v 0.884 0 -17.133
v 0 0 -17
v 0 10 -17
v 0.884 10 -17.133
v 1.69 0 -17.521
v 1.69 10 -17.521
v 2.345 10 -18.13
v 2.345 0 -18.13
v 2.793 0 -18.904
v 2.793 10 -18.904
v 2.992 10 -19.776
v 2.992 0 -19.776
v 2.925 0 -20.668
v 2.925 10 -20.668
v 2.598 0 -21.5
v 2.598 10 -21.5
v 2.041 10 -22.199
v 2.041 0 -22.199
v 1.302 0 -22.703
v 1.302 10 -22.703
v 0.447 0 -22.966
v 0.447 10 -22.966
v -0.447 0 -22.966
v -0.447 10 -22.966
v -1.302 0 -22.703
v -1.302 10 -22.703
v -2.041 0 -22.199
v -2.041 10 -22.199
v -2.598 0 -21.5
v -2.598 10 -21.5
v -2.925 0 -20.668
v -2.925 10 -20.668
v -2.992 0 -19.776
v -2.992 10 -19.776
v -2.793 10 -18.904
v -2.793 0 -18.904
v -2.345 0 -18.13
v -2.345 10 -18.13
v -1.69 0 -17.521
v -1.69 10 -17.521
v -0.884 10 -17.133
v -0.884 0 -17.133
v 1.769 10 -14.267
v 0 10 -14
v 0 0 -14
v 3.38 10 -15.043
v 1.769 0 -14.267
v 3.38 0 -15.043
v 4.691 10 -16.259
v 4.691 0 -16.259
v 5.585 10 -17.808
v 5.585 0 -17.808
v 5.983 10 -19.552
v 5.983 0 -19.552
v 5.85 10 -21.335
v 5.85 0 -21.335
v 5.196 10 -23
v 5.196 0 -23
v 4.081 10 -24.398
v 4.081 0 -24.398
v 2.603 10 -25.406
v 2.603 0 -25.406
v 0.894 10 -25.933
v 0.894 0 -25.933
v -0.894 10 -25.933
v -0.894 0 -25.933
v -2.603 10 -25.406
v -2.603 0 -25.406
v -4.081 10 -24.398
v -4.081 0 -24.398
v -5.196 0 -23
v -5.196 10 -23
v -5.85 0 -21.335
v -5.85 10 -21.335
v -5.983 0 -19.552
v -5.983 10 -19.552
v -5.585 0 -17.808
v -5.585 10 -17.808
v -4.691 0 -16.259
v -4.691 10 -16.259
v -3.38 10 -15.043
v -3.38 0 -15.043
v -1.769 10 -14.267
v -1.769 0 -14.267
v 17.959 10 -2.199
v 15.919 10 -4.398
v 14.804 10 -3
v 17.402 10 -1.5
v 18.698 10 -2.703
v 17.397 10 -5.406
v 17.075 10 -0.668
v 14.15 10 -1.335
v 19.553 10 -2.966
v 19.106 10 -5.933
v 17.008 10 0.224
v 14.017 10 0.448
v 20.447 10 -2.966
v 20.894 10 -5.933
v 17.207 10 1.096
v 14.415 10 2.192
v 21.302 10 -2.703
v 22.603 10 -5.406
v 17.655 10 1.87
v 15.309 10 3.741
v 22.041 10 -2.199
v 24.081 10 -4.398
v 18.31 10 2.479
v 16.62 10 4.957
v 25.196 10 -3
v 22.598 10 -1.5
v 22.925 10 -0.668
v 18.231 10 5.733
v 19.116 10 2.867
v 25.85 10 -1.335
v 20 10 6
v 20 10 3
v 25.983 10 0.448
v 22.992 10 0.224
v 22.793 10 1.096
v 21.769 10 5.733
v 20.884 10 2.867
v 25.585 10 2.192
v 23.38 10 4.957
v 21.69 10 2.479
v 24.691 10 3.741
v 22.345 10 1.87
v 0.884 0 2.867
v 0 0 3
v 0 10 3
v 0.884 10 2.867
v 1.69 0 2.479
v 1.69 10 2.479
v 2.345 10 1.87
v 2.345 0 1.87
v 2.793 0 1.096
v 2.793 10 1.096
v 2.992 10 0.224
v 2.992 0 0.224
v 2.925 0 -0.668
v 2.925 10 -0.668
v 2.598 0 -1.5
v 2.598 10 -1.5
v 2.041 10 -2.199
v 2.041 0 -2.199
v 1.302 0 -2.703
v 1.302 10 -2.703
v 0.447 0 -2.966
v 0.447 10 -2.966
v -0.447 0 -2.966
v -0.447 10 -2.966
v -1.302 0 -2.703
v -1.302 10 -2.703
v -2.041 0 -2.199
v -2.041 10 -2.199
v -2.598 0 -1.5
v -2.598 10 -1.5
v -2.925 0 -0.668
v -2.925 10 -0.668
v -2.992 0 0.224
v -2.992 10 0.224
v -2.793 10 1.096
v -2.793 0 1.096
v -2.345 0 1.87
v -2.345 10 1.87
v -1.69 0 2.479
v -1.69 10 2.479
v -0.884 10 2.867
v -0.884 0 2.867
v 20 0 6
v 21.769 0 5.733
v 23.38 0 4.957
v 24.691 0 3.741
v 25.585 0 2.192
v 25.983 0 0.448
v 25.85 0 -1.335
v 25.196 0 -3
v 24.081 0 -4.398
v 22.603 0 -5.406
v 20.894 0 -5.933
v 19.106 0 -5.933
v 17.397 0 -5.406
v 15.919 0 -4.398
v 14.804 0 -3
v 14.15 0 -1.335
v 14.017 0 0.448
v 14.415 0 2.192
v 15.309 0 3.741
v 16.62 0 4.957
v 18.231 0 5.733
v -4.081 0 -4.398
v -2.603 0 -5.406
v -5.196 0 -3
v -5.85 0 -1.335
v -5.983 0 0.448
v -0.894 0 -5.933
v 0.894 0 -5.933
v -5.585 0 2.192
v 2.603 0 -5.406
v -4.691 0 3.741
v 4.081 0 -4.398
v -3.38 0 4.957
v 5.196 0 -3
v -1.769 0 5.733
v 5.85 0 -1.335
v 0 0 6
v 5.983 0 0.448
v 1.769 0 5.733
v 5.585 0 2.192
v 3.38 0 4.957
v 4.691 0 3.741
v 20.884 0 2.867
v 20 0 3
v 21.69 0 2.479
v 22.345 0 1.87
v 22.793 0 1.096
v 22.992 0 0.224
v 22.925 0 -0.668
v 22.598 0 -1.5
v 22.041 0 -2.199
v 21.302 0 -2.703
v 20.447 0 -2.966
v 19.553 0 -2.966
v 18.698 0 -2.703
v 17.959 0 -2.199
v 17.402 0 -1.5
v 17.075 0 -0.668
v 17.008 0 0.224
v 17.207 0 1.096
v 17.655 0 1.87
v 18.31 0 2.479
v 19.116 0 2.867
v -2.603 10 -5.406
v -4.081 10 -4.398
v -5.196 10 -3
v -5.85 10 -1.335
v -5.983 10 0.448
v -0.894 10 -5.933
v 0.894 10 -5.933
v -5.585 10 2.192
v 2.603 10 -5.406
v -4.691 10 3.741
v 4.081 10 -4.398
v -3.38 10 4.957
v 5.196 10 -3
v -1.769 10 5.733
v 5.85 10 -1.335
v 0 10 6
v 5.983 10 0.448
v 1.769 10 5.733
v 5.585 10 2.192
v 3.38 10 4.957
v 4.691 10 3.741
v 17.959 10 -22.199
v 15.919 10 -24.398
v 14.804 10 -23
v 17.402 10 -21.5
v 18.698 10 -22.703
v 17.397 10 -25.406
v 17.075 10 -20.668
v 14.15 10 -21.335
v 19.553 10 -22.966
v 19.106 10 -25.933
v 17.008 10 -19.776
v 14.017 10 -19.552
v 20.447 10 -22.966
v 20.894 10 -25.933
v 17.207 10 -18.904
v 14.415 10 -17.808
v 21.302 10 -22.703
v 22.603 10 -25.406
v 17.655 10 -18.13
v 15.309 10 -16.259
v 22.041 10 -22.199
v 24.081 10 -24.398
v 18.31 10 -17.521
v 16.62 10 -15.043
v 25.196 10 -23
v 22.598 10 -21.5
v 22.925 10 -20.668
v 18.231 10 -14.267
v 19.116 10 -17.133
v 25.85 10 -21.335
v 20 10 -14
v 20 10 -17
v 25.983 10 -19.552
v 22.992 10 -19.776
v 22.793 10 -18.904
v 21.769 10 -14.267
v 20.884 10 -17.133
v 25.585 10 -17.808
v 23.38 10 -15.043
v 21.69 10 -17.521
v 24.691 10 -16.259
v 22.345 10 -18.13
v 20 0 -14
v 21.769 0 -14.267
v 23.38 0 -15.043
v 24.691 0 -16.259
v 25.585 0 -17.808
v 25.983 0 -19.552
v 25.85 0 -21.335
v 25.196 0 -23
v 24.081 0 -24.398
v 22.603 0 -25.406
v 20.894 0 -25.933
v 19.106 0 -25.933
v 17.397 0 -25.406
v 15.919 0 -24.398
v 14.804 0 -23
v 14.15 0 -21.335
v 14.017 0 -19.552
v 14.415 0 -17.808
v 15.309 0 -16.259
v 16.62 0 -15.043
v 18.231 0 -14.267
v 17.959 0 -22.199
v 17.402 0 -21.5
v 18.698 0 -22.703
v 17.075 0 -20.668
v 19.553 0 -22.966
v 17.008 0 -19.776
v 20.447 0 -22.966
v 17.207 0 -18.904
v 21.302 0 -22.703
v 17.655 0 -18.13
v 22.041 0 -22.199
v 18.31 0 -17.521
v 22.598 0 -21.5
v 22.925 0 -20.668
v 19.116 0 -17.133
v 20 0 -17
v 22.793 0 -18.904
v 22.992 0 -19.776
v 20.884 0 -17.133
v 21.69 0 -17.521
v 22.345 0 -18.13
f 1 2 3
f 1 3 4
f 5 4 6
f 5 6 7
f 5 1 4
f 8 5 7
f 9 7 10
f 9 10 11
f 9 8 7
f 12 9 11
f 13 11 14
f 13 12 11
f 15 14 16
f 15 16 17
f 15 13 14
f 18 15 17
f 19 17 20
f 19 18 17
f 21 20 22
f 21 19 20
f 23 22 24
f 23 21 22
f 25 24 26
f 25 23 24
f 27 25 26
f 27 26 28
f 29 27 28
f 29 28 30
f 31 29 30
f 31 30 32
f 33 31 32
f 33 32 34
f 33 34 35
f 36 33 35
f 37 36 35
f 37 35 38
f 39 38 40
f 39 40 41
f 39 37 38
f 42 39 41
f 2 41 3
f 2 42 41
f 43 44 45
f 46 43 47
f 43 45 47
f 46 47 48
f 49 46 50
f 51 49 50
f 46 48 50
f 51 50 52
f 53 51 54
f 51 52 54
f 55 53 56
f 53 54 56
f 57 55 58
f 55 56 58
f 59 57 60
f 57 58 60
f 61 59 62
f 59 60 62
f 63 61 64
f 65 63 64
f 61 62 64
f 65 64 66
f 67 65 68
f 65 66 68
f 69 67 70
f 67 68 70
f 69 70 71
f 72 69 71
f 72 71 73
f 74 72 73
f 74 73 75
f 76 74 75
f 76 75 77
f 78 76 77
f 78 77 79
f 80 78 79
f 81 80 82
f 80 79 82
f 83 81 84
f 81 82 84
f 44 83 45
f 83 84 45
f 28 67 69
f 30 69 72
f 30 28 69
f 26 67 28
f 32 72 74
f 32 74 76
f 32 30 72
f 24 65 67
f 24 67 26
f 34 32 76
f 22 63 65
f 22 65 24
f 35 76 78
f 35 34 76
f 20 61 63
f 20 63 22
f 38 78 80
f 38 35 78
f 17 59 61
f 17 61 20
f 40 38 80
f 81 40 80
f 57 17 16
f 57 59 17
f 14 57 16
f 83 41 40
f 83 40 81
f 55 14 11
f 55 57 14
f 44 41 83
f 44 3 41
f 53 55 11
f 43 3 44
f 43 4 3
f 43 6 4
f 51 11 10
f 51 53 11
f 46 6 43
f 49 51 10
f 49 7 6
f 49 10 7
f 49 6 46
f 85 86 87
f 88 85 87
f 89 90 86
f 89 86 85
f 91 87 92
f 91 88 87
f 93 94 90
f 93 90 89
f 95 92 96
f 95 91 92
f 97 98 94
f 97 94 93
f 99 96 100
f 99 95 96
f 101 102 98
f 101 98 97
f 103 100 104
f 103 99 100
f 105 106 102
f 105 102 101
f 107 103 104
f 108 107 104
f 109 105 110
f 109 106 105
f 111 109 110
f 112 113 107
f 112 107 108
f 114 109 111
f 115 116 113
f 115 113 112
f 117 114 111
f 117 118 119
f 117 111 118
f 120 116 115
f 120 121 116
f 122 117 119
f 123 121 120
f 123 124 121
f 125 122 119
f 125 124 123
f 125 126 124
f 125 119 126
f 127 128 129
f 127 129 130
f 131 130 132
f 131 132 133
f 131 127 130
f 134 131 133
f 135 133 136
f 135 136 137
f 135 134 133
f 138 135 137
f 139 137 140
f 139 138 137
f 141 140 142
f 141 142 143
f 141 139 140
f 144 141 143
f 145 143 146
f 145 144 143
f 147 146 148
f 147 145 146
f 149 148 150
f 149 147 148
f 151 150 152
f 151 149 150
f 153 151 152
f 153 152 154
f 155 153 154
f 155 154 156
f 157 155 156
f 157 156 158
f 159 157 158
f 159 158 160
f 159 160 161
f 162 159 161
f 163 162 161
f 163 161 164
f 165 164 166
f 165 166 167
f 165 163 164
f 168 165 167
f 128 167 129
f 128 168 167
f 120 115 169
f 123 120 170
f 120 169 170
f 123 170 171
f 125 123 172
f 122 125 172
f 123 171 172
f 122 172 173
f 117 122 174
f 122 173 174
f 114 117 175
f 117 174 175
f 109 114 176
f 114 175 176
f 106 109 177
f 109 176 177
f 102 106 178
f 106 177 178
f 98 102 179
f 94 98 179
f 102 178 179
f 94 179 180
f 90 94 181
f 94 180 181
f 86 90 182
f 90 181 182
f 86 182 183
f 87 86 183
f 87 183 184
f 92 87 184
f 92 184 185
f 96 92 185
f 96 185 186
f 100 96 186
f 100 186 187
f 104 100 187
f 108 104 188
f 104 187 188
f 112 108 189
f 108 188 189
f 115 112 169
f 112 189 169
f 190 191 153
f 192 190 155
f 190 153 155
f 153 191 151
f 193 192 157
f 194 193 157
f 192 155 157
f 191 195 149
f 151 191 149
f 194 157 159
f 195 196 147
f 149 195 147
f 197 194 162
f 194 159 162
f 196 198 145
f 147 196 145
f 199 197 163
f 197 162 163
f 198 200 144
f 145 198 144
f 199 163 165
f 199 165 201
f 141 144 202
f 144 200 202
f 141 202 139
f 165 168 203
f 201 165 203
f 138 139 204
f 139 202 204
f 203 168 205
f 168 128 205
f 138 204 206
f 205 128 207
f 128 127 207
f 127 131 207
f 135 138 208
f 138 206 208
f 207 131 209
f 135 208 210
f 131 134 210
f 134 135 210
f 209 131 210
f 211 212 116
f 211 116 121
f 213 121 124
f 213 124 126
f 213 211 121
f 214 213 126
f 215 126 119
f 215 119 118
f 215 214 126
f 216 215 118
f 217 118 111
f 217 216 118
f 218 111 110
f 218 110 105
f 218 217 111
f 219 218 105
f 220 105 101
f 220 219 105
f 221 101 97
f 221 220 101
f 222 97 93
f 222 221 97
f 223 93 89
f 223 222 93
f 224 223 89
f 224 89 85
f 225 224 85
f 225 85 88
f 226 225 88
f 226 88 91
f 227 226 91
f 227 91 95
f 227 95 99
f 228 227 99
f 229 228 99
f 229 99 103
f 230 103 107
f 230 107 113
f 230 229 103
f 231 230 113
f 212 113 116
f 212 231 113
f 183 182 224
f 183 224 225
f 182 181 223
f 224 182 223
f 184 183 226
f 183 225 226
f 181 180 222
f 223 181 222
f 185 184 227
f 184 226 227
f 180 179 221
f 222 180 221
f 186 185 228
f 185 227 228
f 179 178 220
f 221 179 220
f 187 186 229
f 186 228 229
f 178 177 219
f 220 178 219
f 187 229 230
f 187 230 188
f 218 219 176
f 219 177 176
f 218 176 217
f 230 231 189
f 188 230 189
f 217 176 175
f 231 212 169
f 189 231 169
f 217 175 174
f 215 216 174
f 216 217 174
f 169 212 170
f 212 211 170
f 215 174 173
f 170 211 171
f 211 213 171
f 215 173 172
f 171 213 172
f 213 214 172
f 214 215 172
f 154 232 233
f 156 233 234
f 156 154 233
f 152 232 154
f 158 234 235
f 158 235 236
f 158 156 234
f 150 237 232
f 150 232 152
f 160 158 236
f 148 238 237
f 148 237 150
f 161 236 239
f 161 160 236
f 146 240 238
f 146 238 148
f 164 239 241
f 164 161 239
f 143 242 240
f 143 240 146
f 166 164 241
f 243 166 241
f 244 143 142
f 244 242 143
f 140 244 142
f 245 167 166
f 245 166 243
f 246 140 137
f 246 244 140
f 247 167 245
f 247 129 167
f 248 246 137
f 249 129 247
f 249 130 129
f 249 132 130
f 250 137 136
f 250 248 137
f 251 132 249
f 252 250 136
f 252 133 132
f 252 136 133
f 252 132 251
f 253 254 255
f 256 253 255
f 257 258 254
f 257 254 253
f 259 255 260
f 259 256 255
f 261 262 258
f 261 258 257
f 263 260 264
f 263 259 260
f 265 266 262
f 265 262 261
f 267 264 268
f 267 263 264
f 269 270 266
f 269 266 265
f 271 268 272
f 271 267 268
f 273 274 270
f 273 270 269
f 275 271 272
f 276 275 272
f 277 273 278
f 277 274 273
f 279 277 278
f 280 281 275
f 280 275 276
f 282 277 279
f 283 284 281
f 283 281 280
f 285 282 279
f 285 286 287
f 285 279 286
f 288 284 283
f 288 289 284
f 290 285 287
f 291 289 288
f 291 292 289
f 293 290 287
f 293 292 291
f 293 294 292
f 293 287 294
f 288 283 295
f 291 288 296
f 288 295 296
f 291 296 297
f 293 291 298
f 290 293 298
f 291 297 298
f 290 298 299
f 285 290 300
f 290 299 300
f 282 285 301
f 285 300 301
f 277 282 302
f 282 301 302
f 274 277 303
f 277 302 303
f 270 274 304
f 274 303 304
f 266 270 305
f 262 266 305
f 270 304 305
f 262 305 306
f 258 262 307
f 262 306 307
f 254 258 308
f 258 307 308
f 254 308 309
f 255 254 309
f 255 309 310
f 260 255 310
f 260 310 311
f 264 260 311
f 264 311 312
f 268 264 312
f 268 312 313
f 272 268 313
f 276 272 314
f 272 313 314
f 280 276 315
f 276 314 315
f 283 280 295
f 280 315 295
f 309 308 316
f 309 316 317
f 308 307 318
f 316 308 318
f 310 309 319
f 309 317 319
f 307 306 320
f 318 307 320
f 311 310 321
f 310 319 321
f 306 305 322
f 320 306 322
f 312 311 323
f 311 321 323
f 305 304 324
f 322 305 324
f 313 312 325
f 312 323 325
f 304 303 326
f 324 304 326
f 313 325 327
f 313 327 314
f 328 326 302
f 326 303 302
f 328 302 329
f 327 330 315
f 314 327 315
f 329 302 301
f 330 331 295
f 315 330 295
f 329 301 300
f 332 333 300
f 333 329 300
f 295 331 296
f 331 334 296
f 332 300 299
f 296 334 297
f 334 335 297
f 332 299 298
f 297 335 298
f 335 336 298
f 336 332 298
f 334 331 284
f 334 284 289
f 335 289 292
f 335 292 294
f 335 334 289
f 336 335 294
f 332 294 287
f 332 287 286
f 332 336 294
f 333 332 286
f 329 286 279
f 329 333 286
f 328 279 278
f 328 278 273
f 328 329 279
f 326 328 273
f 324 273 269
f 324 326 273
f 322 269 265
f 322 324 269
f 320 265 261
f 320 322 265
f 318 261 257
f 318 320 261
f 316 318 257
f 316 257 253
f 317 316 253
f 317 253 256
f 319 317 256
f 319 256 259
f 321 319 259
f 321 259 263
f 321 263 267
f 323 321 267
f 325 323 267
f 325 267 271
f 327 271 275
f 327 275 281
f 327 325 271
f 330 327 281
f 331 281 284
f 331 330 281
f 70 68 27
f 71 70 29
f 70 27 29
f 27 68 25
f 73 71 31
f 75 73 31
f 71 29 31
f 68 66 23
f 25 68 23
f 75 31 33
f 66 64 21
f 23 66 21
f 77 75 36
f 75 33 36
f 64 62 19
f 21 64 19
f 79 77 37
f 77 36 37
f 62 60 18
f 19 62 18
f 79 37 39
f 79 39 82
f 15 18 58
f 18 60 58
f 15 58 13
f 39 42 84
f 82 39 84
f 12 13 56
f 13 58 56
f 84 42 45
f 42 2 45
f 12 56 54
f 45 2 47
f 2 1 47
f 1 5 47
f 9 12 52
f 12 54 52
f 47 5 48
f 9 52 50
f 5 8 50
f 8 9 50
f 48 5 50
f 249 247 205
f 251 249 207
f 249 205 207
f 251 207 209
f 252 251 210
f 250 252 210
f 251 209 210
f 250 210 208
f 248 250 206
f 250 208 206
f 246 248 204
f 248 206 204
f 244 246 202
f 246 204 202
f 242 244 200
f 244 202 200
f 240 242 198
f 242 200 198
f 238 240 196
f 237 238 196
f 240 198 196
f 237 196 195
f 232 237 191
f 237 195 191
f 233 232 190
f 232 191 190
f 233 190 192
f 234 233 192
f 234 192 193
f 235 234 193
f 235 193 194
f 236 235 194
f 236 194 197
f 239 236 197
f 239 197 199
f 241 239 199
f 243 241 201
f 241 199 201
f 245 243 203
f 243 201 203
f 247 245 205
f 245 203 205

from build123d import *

# Parameters (mm, degrees)
SKETCH_1_R        = 6
SKETCH_1_R_2      = 3
EXTRUDE_1_DEPTH   = 10
EXTRUDE_1_2_DEPTH = 10
EXTRUDE_1_3_DEPTH = 10
EXTRUDE_1_4_DEPTH = 10


with BuildPart() as part:
    # Эскиз1 → Бобышка-Вытянуть1 (new body)
    with BuildSketch(Plane(origin=(0, 0, 0), x_dir=(1, 0, 0), z_dir=(0, 1, 0))):
        with Locations(Location((0, 0, 0), (0, 0, 270))):
            Circle(SKETCH_1_R)
        with Locations(Location((0, 0, 0), (0, 0, 270))):
            Circle(SKETCH_1_R_2, mode=Mode.SUBTRACT)
    extrude(amount=EXTRUDE_1_DEPTH)


with BuildPart() as body_2:
    # Эскиз1 → Extrude 1 2 (new body)
    with BuildSketch(Plane(origin=(0, 0, 0), x_dir=(1, 0, 0), z_dir=(0, 1, 0))):
        with Locations(Location((0, 20, 0), (0, 0, 270))):
            Circle(SKETCH_1_R)
        with Locations(Location((0, 20, 0), (0, 0, 270))):
            Circle(SKETCH_1_R_2, mode=Mode.SUBTRACT)
    extrude(amount=EXTRUDE_1_2_DEPTH)


with BuildPart() as body_3:
    # Эскиз1 → Extrude 1 3 (new body)
    with BuildSketch(Plane(origin=(0, 0, 0), x_dir=(1, 0, 0), z_dir=(0, 1, 0))):
        with Locations(Location((20, 20, 0), (0, 0, 270))):
            Circle(SKETCH_1_R)
        with Locations(Location((20, 20, 0), (0, 0, 270))):
            Circle(SKETCH_1_R_2, mode=Mode.SUBTRACT)
    extrude(amount=EXTRUDE_1_3_DEPTH)


with BuildPart() as body_4:
    # Эскиз1 → Extrude 1 4 (new body)
    with BuildSketch(Plane(origin=(0, 0, 0), x_dir=(1, 0, 0), z_dir=(0, 1, 0))):
        with Locations(Location((20, 0, 0), (0, 0, 270))):
            Circle(SKETCH_1_R)
        with Locations(Location((20, 0, 0), (0, 0, 270))):
            Circle(SKETCH_1_R_2, mode=Mode.SUBTRACT)
    extrude(amount=EXTRUDE_1_4_DEPTH)


solid = Compound([part.part, body_2.part, body_3.part, body_4.part])
